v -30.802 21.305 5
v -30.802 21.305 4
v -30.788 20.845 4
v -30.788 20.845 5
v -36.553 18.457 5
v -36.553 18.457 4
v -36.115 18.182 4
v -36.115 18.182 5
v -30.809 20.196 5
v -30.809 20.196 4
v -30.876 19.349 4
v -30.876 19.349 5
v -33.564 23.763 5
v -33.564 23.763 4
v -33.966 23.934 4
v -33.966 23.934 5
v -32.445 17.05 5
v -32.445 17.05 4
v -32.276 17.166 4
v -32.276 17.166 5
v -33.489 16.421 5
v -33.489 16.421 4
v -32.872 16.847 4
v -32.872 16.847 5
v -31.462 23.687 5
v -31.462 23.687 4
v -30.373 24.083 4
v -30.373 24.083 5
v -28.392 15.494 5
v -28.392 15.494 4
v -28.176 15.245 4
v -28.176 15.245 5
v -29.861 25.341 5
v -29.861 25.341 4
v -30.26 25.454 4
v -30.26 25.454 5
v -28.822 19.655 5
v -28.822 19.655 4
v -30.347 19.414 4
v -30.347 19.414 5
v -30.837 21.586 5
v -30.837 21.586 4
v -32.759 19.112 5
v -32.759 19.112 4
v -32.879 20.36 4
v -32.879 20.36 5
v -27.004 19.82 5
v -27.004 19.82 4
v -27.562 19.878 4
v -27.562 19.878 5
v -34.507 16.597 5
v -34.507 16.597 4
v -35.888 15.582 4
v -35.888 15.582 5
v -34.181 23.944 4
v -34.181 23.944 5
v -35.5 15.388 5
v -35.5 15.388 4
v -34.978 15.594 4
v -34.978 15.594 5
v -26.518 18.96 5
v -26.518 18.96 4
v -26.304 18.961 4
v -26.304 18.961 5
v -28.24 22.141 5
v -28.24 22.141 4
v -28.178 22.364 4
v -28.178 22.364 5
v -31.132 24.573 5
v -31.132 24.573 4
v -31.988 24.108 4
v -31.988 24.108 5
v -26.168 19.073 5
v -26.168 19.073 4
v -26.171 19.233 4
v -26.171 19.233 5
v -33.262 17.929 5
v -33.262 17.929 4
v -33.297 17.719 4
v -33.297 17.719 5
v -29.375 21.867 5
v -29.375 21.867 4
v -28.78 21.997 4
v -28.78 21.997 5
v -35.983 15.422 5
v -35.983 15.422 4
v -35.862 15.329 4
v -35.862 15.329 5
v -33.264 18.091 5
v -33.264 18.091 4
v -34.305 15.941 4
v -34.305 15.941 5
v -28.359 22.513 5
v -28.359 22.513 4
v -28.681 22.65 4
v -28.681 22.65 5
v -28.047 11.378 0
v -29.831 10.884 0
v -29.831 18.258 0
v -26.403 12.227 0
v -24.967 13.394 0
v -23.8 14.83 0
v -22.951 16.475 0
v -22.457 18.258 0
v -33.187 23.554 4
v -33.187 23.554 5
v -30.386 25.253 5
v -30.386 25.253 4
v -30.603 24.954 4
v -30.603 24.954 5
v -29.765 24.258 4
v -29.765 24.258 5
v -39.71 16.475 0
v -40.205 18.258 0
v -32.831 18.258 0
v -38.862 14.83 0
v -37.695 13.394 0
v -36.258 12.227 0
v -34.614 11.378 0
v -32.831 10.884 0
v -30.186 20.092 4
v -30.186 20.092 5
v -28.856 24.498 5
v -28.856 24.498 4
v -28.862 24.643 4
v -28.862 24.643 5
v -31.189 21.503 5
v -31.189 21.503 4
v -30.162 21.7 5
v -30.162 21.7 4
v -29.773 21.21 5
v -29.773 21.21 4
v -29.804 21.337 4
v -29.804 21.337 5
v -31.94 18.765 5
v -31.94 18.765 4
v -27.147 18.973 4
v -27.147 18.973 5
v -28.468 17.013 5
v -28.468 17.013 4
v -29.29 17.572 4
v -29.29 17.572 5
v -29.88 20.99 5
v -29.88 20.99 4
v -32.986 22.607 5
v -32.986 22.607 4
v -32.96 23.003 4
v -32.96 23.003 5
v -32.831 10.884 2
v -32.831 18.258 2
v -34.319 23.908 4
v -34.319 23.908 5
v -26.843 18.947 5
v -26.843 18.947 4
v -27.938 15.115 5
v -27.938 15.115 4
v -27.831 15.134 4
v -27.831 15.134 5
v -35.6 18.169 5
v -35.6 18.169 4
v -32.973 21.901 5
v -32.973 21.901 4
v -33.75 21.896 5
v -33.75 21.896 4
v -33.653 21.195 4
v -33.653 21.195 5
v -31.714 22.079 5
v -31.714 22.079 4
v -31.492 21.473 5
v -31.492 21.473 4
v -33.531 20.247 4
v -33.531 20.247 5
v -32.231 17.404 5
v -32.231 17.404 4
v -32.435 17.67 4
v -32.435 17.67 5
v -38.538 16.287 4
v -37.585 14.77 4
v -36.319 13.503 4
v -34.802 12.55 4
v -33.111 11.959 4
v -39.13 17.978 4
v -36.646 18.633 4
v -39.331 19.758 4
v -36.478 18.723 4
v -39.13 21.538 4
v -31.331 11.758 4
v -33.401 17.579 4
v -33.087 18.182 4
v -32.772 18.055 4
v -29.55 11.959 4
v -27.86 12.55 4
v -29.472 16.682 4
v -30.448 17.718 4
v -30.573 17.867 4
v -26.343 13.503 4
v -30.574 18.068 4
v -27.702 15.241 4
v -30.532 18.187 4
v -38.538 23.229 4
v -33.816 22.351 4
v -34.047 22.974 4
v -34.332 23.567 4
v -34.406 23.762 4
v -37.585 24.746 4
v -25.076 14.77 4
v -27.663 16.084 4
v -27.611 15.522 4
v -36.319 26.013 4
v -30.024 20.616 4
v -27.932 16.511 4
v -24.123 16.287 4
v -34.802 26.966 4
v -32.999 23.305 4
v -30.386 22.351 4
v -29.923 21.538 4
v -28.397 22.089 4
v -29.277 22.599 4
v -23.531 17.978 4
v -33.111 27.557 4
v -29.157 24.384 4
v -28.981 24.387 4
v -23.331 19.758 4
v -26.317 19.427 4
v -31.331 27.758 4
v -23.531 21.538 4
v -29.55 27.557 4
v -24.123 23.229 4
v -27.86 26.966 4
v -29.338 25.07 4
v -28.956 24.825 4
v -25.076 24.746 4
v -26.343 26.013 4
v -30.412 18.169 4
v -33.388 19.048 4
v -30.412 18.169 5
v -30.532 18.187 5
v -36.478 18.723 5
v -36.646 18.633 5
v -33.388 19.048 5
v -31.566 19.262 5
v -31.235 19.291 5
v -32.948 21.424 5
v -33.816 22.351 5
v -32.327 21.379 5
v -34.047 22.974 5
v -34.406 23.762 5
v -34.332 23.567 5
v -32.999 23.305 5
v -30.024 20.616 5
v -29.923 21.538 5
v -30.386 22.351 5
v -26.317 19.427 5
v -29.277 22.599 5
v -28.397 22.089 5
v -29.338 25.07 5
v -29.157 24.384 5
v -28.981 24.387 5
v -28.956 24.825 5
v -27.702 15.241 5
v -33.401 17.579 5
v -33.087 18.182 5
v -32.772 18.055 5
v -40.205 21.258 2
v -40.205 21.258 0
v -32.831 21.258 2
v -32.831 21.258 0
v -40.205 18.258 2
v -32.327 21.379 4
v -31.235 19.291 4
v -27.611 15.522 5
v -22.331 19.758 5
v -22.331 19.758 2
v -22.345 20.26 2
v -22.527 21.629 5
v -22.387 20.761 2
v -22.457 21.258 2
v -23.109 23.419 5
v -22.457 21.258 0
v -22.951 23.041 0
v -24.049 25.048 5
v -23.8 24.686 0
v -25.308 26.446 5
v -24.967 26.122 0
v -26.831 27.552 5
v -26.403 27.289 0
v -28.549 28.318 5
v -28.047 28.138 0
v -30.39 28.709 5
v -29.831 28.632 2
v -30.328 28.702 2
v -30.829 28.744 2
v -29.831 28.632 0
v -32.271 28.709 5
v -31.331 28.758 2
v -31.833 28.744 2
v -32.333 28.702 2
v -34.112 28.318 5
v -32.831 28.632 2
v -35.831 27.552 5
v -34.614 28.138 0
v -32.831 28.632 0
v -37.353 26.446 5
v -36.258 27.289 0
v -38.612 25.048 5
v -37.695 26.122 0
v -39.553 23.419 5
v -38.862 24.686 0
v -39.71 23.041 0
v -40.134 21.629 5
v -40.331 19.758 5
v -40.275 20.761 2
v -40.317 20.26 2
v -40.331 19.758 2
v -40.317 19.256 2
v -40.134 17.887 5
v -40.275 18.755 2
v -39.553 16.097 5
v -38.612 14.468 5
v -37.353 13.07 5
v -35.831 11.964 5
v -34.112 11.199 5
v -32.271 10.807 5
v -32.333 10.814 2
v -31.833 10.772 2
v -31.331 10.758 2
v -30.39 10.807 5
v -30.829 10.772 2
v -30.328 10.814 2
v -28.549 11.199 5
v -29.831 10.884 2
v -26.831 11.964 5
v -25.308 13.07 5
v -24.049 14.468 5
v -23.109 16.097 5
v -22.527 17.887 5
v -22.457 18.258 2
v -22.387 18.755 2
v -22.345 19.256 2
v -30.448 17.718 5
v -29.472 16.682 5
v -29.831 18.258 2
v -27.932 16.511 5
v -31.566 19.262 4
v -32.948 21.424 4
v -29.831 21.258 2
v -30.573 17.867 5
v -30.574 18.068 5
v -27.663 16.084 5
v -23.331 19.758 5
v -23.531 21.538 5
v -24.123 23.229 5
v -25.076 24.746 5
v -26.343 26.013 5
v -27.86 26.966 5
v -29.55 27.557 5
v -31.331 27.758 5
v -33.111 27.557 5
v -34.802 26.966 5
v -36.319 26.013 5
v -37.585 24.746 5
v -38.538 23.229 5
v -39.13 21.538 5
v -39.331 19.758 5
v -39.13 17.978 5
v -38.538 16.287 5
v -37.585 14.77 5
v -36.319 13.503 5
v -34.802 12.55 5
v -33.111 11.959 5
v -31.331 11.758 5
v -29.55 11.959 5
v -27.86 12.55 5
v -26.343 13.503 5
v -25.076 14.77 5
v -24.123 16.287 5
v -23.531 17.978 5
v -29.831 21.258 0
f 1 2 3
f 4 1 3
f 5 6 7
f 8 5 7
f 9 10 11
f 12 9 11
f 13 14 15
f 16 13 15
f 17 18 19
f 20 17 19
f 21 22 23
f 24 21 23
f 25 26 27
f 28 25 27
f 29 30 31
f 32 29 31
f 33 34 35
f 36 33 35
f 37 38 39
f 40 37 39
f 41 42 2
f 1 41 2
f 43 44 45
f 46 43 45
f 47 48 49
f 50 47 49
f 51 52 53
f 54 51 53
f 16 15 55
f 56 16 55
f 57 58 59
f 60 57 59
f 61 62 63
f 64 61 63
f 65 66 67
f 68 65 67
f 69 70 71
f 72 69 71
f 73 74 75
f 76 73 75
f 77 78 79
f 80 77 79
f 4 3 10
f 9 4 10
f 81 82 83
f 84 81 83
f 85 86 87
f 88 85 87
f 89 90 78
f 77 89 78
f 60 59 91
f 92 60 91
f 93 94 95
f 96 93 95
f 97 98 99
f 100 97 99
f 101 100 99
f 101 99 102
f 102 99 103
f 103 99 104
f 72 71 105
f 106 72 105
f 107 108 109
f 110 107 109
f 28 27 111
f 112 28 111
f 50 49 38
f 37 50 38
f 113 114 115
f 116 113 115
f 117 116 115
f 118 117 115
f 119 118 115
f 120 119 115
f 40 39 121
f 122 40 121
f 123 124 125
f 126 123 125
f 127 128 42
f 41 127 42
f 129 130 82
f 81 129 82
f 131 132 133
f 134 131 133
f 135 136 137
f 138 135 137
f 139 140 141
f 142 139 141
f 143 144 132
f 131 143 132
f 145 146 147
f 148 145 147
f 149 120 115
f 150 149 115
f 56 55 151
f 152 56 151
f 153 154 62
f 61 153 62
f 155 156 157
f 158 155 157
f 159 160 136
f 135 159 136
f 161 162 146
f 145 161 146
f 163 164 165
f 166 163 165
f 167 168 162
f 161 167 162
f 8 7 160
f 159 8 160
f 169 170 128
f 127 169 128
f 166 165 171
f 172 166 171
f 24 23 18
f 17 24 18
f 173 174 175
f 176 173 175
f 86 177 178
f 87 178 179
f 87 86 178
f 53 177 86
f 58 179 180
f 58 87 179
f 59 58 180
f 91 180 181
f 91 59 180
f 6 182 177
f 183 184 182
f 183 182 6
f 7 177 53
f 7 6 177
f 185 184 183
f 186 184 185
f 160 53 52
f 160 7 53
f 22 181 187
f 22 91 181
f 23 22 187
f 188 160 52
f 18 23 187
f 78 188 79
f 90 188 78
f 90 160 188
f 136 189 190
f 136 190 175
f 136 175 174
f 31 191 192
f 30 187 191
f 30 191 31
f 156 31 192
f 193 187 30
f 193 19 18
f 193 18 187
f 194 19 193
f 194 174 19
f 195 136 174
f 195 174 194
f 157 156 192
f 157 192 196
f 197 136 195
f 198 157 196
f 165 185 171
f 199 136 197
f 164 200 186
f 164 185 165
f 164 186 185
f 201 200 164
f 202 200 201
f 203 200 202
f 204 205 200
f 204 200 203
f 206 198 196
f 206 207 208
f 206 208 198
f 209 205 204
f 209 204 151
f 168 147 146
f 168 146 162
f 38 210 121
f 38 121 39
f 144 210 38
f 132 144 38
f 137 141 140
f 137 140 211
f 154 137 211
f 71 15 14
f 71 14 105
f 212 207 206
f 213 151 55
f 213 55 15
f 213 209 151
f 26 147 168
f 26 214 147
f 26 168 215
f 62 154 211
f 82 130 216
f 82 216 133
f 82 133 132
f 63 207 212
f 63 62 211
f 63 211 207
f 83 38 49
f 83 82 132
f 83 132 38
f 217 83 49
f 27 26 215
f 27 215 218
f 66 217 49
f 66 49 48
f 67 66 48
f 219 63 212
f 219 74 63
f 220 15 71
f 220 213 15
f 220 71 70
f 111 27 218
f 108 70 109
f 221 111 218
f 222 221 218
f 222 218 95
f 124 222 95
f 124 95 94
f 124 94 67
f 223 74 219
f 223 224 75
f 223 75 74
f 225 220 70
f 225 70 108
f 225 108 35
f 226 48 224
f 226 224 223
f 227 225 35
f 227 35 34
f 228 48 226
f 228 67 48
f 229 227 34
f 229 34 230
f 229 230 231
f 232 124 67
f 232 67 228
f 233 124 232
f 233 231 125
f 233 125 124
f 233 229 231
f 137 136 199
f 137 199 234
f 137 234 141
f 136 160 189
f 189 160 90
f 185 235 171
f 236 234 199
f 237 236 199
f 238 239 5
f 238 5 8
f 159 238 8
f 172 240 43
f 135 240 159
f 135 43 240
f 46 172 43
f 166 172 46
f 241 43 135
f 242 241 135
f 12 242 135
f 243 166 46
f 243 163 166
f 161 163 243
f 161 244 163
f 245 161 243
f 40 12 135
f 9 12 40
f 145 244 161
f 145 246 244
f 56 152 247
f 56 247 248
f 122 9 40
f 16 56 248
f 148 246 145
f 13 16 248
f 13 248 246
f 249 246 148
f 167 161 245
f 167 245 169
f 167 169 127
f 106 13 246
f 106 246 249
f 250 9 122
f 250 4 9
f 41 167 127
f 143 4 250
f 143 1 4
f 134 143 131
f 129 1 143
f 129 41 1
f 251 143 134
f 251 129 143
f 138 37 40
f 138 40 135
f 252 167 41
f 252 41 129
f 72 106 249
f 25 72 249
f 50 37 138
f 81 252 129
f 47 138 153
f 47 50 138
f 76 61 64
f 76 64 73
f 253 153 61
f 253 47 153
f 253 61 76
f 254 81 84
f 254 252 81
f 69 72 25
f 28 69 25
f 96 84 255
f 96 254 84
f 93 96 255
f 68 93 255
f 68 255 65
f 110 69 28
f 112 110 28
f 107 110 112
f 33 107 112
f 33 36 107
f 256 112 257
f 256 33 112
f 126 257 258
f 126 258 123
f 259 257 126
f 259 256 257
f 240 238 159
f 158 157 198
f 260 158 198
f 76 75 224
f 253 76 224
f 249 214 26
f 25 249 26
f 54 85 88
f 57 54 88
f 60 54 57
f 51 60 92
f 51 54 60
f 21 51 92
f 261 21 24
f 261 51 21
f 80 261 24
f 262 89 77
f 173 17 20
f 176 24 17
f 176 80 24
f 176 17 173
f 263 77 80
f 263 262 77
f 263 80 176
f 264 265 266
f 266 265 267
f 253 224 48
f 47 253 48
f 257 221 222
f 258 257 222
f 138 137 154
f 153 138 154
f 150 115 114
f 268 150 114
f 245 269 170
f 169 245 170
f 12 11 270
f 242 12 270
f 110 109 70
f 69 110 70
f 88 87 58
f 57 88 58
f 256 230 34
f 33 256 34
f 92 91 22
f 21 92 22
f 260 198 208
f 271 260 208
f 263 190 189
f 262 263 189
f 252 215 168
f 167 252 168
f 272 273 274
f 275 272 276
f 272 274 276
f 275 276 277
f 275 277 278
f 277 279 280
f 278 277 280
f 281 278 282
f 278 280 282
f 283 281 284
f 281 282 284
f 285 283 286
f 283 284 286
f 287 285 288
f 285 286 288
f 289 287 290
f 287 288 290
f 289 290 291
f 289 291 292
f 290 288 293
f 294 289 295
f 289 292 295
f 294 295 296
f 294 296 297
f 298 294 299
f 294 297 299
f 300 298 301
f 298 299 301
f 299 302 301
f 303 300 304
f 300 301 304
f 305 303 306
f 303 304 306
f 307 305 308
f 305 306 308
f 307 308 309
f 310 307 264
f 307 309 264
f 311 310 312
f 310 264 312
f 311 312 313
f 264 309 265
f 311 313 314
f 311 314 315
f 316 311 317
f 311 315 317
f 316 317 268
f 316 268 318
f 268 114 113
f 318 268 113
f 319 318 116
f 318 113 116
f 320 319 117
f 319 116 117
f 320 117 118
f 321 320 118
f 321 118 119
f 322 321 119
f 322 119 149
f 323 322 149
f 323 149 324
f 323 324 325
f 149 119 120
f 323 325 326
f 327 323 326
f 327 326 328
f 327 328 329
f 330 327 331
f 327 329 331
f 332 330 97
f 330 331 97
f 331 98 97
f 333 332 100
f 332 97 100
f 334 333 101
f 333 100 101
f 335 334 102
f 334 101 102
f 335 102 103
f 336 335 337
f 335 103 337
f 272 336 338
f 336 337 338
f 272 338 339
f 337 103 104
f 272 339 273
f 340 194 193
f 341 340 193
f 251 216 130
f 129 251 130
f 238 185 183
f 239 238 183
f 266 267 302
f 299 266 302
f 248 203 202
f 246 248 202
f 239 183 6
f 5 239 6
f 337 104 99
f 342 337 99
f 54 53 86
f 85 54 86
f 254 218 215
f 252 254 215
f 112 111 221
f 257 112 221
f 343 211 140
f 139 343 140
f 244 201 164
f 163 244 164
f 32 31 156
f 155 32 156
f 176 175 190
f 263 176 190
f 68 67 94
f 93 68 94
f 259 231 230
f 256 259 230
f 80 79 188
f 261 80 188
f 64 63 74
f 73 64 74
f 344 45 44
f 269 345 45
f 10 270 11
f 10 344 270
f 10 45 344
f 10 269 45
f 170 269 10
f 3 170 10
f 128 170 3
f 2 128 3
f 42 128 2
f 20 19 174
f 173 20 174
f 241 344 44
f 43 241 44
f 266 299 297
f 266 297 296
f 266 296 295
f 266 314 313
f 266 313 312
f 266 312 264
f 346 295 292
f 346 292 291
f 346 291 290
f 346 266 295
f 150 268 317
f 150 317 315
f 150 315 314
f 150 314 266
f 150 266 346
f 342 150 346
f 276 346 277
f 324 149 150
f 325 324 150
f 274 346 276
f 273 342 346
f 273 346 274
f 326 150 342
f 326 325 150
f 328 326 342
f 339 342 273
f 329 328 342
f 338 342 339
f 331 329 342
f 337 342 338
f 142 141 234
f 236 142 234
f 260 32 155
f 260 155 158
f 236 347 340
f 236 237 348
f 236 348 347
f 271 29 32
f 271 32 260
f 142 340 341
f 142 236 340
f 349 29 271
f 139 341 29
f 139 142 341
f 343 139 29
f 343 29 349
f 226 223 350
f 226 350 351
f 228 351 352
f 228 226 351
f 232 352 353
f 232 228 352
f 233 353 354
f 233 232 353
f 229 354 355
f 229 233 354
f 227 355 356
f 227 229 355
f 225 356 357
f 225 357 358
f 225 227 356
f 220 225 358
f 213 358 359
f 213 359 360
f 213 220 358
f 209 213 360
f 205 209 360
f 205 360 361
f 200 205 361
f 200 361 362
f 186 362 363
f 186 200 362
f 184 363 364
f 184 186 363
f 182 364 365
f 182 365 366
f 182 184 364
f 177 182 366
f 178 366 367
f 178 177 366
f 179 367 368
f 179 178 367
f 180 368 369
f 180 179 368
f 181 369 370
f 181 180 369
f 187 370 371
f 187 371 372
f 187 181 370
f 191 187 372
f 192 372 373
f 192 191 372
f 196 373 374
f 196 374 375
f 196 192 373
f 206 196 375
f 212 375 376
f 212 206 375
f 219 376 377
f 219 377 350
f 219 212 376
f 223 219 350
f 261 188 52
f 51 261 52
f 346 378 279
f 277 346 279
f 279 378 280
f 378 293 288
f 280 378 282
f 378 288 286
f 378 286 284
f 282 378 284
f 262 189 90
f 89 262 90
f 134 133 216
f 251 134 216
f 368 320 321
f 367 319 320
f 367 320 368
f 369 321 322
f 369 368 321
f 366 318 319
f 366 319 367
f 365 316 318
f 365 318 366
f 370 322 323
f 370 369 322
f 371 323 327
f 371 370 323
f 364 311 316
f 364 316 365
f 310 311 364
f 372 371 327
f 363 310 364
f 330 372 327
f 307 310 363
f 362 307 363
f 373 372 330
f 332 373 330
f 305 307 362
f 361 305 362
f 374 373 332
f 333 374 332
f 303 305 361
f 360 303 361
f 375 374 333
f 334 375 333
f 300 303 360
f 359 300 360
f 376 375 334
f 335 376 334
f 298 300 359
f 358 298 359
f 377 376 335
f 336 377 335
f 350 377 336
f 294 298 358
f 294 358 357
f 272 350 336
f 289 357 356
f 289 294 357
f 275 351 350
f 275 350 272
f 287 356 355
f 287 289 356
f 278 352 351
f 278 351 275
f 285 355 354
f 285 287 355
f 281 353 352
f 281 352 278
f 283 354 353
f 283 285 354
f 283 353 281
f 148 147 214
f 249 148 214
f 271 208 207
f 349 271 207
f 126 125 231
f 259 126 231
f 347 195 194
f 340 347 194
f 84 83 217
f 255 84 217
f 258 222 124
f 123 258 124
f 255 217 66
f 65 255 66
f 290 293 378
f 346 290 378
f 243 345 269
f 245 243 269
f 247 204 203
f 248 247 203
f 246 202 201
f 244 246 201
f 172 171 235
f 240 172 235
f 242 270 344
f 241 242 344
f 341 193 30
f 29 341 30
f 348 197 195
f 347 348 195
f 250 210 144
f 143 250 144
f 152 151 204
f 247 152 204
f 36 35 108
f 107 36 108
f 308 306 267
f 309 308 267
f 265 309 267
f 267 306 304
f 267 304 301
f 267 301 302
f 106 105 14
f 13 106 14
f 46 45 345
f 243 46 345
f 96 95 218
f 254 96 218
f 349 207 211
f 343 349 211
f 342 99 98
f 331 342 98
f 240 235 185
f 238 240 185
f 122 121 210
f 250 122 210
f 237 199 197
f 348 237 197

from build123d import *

# Parameters (mm, degrees)
F0_R     = 9
F1_DEPTH = 4
F3_W     = 3
F3_H     = 3
F4_DEPTH = 2
F2_R     = 9
F2_R_2   = 8
F5_DEPTH = 1
F7_DEPTH = 1


# Not quite as in the source:
# - a feature names something its author has since deleted; it is built from what else it names


with BuildPart() as f1:
    # F0 (on Top) → F1 (new body)
    with BuildSketch(Plane.XY):
        with Locations((-31.3306450844, 19.7580661625)):
            Circle(F0_R)
    extrude(amount=F1_DEPTH)

    # F3 (on face) → F4 (cut)
    with BuildSketch(Plane(origin=(0, 0, 0), x_dir=(1, 0, 0), z_dir=(0, 0, -1))):
        with BuildLine():
            ThreePointArc((-32.8306450844, -28.6321858371), (-32.0832814269, -28.7265408676), (-31.3306450844, -28.7580661625))
            ThreePointArc((-31.3306450844, -28.7580661625), (-30.5780087419, -28.7265408676), (-29.8306450844, -28.6321858371))
            Line((-29.8306450844, -28.6321858371), (-29.8306450844, -21.2580661625))
            Line((-29.8306450844, -21.2580661625), (-32.8306450844, -21.2580661625))
            Line((-32.8306450844, -21.2580661625), (-32.8306450844, -28.6321858371))
        make_face()
        with BuildLine():
            ThreePointArc((-40.204764759, -18.2580661625), (-40.2991197895, -19.0054298199), (-40.3306450844, -19.7580661625))
            ThreePointArc((-40.3306450844, -19.7580661625), (-40.2991197895, -20.510702505), (-40.204764759, -21.2580661625))
            Line((-40.204764759, -21.2580661625), (-32.8306450844, -21.2580661625))
            Line((-32.8306450844, -21.2580661625), (-32.8306450844, -18.2580661625))
            Line((-32.8306450844, -18.2580661625), (-40.204764759, -18.2580661625))
        make_face()
        with Locations((-31.3306450844, -19.7580661625)):
            Rectangle(F3_W, F3_H)
        with BuildLine():
            Line((-29.8306450844, -18.2580661625), (-29.8306450844, -21.2580661625))
            Line((-29.8306450844, -21.2580661625), (-22.4565254097, -21.2580661625))
            ThreePointArc((-22.4565254097, -21.2580661625), (-22.3621703793, -20.510702505), (-22.3306450844, -19.7580661625))
            ThreePointArc((-22.3306450844, -19.7580661625), (-22.3621703793, -19.0054298199), (-22.4565254097, -18.2580661625))
            Line((-22.4565254097, -18.2580661625), (-29.8306450844, -18.2580661625))
        make_face()
        with BuildLine():
            Line((-32.8306450844, -10.8839464878), (-32.8306450844, -18.2580661625))
            Line((-32.8306450844, -18.2580661625), (-29.8306450844, -18.2580661625))
            Line((-29.8306450844, -18.2580661625), (-29.8306450844, -10.8839464878))
            ThreePointArc((-29.8306450844, -10.8839464878), (-30.5780087419, -10.7895914574), (-31.3306450844, -10.7580661625))
            ThreePointArc((-31.3306450844, -10.7580661625), (-32.0832814269, -10.7895914574), (-32.8306450844, -10.8839464878))
        make_face()
    extrude(amount=-F4_DEPTH, mode=Mode.SUBTRACT)

    # F2 (on face) → F5 (join)
    with BuildSketch(Plane.XY.offset(4)):
        with Locations((-31.3306450844, 19.7580661625)):
            Circle(F2_R)
        with Locations((-31.3306450844, 19.7580661625)):
            Circle(F2_R_2, mode=Mode.SUBTRACT)
    extrude(amount=F5_DEPTH)

    # F6 (on face) → F7 (join)
    with BuildSketch(Plane.XY.offset(4)):
        Polygon((-33.5311048114, 20.2471387647), (-33.3884463109, 19.0475286451), (-36.4782309787, 18.7233090579), (-36.6460120564, 18.6325285146), (-36.5527999544, 18.4574668773), (-36.1151093936, 18.1818667), (-35.5996001325, 18.1688972107), (-31.940004334, 18.7654525459), (-27.1472810179, 18.9729526111), (-26.8433067742, 18.9470136325), (-26.5182754911, 18.9599831218), (-26.3042936222, 18.9607948177), (-26.1681286891, 19.0734676237), (-26.1713637091, 19.2331364476), (-26.3172925208, 19.4268553276), (-27.0038225852, 19.8199867228), (-27.5623046758, 19.8775230241), (-28.8218450116, 19.6546301455), (-30.3473039921, 19.4138858383), (-30.18602354, 20.0915166568), (-30.0238608098, 20.6159310458), (-29.880402377, 20.9895817386), (-29.7734114426, 21.2100336476), (-29.8042323605, 21.3373169803), (-29.9225752742, 21.5375353096), (-30.1624961218, 21.6996392213), (-29.3754451629, 21.8673897134), (-28.780495574, 21.9970846065), (-28.3971162937, 22.088665082), (-28.2398943213, 22.1405430392), (-28.1782524855, 22.3642887867), (-28.3590018762, 22.5125703402), (-28.6807981392, 22.649558733), (-29.2765711877, 22.5985042354), (-30.3861830508, 22.3512898882), (-31.7138705535, 22.078960022), (-32.9734520623, 21.9006221917), (-32.9856098557, 22.6074446543), (-32.960482573, 23.0029993736), (-32.999385159, 23.3045032384), (-31.4617801489, 23.6870590591), (-30.3732429707, 24.0826137783), (-29.7652944833, 24.2577165886), (-29.1574048143, 24.3841764617), (-28.9807139033, 24.3874114817), (-28.8559009495, 24.4975786176), (-28.8615475299, 24.6426839697), (-28.956421844, 24.8250802796), (-29.338154205, 25.0698242479), (-29.860992257, 25.3405660134), (-30.2597819962, 25.4540269879), (-30.3861830508, 25.2530440175), (-30.6026352986, 24.9539517131), (-31.1318963358, 24.5729839931), (-31.9878296934, 24.1077292973), (-33.1874221675, 23.554129146), (-33.564325526, 23.7632878942), (-33.9655444712, 23.9335087652), (-34.1811556138, 23.9440372849), (-34.3189557025, 23.9075697866), (-34.4056660024, 23.7616409749), (-34.3319251918, 23.5671280446), (-34.0466140726, 22.9738253749), (-33.8164159306, 22.3512898882), (-33.7499509741, 21.8957990709), (-33.6534885593, 21.1954466483), align=None)
        Polygon((-31.2348405543, 19.2906962764), (-31.5663359955, 19.2615222777), (-32.7594584296, 19.1123702098), (-32.8794306171, 20.3597939252), (-32.9475130837, 21.4240155165), (-32.3266362799, 21.3794898775), (-31.491783489, 21.4726584538), (-31.189438519, 21.502655912), (-30.8368507473, 21.5861782468), (-30.8019713497, 21.3049079617), (-30.78820781, 20.8445116777), (-30.8093236679, 20.1960725034), (-30.875765097, 19.3490442736), align=None, mode=Mode.SUBTRACT)
        Polygon((-33.2968599535, 17.7190588557), (-33.4014158002, 17.5788295611), (-34.506992711, 16.59725979), (-35.8881580354, 15.5816534911), (-35.9829911765, 15.4219770208), (-35.8622190568, 15.3287649188), (-35.4999026976, 15.3879328466), (-34.9779175146, 15.5938112845), (-34.3051745173, 15.940721302), (-33.4889613235, 16.4213746931), (-32.8721312356, 16.846909225), (-32.4449733118, 17.0503566924), (-32.2763817145, 17.1662645184), (-32.2309973247, 17.4037443963), (-32.4352388425, 17.6704218003), (-32.7724279189, 18.0554362362), (-33.0869306823, 18.1818667), (-33.2644274074, 18.0910861567), (-33.2619982015, 17.9289881268), align=None)
        Polygon((-30.5726378404, 17.8665698862), (-30.4478248866, 17.7182471597), (-29.4719075777, 16.6815585296), (-28.392293173, 15.4941144379), (-28.1758409251, 15.2452784634), (-27.9383904565, 15.1147812853), (-27.8313407034, 15.1342343429), (-27.7016458104, 15.2412252774), (-27.6108887945, 15.5224832106), (-27.6627667517, 16.0841914985), (-27.9318615979, 16.5113435404), (-28.4684631895, 17.0130716164), (-29.2895112678, 17.5723359936), (-30.4121220294, 18.1688972107), (-30.5321118624, 18.1867427574), (-30.5742259411, 18.0684057255), align=None)
    extrude(amount=F7_DEPTH)


solid = f1.part
